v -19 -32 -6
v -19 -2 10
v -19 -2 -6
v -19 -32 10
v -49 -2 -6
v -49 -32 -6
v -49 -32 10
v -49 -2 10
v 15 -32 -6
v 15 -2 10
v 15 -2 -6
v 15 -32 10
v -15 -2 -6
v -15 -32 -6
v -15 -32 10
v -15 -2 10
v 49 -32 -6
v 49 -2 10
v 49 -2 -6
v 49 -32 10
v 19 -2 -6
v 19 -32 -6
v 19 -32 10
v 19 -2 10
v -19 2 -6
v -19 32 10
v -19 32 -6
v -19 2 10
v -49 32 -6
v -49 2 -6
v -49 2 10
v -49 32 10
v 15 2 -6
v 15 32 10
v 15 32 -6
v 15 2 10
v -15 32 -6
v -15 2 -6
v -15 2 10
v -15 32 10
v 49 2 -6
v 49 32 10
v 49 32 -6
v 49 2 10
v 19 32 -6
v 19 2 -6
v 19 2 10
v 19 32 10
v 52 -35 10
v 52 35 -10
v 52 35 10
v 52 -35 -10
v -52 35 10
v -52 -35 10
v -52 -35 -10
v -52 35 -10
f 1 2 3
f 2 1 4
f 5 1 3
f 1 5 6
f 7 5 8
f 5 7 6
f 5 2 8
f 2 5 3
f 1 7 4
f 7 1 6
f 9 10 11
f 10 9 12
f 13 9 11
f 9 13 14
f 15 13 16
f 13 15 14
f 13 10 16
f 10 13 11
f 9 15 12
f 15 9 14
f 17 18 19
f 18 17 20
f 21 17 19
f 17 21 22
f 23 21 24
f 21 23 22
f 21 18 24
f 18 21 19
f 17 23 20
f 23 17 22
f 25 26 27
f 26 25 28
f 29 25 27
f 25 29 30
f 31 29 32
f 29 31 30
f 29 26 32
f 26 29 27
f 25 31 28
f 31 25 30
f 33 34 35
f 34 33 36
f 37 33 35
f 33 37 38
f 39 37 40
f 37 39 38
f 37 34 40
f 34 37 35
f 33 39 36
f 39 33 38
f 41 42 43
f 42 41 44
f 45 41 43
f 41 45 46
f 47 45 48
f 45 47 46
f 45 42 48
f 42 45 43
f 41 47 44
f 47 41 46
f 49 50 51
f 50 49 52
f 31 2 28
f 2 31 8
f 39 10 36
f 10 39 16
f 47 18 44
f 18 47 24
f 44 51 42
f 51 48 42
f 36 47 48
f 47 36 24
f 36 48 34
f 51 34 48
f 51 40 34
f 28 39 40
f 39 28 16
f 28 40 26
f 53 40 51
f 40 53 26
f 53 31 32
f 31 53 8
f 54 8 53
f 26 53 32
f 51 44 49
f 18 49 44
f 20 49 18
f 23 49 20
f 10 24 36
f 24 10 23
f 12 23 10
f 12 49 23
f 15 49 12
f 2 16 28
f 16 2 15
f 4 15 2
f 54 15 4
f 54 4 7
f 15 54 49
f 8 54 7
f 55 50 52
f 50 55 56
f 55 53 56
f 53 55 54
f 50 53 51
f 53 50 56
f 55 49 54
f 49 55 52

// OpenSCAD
$fn = 32;

// ----------------------------------------------------------------------
// Pocket plate 104 x 70 x 20
// 2 x 3 pockets 30 mm square, 16 mm deep
// ----------------------------------------------------------------------

// --- parameters (mm) ---
thickness = 20;  // plate thickness
floor_t = 4;     // material left under each pocket
pocket = 30;     // pocket side length
pitch_x = 34;    // pocket pitch along X
pitch_y = 34;    // pocket pitch along Y
cols = 3;        // pockets per row
rows = 2;        // rows of pockets

// --- derived feature positions (mm) ---
depth = thickness - floor_t;        // = 16   pocket depth, down to the floor
span_x = (cols - 1) * pitch_x;      // = 68   distance between outer pockets
span_y = (rows - 1) * pitch_y;      // = 34   distance between outer pocket rows
origin_x = -span_x / 2;             // = -34   X of the first pocket
origin_y = -span_y / 2;             // = -17   Y of the first pocket
plate = [span_x + pocket + 6, span_y + pocket + 6, thickness];  // = [104, 70, 20]   overall size: pockets plus 3 mm of wall on each side
feature_centers = [
  [origin_x + 0 * pitch_x, origin_y + 0 * pitch_y],
  [origin_x + 1 * pitch_x, origin_y + 0 * pitch_y],
  [origin_x + 2 * pitch_x, origin_y + 0 * pitch_y],
  [origin_x + 0 * pitch_x, origin_y + 1 * pitch_y],
  [origin_x + 1 * pitch_x, origin_y + 1 * pitch_y],
  [origin_x + 2 * pitch_x, origin_y + 1 * pitch_y]
];   // pocket centres, used verbatim by the cutter loop

// plate outline, then one pocket per centre in feature_centers
difference() {
  cube(plate, center = true);
  for (centre = feature_centers)
    translate([centre[0] - pocket / 2, centre[1] - pocket / 2, plate[2] / 2 - depth])
      cube([pocket, pocket, depth + 1]);  // centred on the declared pocket centre
}
